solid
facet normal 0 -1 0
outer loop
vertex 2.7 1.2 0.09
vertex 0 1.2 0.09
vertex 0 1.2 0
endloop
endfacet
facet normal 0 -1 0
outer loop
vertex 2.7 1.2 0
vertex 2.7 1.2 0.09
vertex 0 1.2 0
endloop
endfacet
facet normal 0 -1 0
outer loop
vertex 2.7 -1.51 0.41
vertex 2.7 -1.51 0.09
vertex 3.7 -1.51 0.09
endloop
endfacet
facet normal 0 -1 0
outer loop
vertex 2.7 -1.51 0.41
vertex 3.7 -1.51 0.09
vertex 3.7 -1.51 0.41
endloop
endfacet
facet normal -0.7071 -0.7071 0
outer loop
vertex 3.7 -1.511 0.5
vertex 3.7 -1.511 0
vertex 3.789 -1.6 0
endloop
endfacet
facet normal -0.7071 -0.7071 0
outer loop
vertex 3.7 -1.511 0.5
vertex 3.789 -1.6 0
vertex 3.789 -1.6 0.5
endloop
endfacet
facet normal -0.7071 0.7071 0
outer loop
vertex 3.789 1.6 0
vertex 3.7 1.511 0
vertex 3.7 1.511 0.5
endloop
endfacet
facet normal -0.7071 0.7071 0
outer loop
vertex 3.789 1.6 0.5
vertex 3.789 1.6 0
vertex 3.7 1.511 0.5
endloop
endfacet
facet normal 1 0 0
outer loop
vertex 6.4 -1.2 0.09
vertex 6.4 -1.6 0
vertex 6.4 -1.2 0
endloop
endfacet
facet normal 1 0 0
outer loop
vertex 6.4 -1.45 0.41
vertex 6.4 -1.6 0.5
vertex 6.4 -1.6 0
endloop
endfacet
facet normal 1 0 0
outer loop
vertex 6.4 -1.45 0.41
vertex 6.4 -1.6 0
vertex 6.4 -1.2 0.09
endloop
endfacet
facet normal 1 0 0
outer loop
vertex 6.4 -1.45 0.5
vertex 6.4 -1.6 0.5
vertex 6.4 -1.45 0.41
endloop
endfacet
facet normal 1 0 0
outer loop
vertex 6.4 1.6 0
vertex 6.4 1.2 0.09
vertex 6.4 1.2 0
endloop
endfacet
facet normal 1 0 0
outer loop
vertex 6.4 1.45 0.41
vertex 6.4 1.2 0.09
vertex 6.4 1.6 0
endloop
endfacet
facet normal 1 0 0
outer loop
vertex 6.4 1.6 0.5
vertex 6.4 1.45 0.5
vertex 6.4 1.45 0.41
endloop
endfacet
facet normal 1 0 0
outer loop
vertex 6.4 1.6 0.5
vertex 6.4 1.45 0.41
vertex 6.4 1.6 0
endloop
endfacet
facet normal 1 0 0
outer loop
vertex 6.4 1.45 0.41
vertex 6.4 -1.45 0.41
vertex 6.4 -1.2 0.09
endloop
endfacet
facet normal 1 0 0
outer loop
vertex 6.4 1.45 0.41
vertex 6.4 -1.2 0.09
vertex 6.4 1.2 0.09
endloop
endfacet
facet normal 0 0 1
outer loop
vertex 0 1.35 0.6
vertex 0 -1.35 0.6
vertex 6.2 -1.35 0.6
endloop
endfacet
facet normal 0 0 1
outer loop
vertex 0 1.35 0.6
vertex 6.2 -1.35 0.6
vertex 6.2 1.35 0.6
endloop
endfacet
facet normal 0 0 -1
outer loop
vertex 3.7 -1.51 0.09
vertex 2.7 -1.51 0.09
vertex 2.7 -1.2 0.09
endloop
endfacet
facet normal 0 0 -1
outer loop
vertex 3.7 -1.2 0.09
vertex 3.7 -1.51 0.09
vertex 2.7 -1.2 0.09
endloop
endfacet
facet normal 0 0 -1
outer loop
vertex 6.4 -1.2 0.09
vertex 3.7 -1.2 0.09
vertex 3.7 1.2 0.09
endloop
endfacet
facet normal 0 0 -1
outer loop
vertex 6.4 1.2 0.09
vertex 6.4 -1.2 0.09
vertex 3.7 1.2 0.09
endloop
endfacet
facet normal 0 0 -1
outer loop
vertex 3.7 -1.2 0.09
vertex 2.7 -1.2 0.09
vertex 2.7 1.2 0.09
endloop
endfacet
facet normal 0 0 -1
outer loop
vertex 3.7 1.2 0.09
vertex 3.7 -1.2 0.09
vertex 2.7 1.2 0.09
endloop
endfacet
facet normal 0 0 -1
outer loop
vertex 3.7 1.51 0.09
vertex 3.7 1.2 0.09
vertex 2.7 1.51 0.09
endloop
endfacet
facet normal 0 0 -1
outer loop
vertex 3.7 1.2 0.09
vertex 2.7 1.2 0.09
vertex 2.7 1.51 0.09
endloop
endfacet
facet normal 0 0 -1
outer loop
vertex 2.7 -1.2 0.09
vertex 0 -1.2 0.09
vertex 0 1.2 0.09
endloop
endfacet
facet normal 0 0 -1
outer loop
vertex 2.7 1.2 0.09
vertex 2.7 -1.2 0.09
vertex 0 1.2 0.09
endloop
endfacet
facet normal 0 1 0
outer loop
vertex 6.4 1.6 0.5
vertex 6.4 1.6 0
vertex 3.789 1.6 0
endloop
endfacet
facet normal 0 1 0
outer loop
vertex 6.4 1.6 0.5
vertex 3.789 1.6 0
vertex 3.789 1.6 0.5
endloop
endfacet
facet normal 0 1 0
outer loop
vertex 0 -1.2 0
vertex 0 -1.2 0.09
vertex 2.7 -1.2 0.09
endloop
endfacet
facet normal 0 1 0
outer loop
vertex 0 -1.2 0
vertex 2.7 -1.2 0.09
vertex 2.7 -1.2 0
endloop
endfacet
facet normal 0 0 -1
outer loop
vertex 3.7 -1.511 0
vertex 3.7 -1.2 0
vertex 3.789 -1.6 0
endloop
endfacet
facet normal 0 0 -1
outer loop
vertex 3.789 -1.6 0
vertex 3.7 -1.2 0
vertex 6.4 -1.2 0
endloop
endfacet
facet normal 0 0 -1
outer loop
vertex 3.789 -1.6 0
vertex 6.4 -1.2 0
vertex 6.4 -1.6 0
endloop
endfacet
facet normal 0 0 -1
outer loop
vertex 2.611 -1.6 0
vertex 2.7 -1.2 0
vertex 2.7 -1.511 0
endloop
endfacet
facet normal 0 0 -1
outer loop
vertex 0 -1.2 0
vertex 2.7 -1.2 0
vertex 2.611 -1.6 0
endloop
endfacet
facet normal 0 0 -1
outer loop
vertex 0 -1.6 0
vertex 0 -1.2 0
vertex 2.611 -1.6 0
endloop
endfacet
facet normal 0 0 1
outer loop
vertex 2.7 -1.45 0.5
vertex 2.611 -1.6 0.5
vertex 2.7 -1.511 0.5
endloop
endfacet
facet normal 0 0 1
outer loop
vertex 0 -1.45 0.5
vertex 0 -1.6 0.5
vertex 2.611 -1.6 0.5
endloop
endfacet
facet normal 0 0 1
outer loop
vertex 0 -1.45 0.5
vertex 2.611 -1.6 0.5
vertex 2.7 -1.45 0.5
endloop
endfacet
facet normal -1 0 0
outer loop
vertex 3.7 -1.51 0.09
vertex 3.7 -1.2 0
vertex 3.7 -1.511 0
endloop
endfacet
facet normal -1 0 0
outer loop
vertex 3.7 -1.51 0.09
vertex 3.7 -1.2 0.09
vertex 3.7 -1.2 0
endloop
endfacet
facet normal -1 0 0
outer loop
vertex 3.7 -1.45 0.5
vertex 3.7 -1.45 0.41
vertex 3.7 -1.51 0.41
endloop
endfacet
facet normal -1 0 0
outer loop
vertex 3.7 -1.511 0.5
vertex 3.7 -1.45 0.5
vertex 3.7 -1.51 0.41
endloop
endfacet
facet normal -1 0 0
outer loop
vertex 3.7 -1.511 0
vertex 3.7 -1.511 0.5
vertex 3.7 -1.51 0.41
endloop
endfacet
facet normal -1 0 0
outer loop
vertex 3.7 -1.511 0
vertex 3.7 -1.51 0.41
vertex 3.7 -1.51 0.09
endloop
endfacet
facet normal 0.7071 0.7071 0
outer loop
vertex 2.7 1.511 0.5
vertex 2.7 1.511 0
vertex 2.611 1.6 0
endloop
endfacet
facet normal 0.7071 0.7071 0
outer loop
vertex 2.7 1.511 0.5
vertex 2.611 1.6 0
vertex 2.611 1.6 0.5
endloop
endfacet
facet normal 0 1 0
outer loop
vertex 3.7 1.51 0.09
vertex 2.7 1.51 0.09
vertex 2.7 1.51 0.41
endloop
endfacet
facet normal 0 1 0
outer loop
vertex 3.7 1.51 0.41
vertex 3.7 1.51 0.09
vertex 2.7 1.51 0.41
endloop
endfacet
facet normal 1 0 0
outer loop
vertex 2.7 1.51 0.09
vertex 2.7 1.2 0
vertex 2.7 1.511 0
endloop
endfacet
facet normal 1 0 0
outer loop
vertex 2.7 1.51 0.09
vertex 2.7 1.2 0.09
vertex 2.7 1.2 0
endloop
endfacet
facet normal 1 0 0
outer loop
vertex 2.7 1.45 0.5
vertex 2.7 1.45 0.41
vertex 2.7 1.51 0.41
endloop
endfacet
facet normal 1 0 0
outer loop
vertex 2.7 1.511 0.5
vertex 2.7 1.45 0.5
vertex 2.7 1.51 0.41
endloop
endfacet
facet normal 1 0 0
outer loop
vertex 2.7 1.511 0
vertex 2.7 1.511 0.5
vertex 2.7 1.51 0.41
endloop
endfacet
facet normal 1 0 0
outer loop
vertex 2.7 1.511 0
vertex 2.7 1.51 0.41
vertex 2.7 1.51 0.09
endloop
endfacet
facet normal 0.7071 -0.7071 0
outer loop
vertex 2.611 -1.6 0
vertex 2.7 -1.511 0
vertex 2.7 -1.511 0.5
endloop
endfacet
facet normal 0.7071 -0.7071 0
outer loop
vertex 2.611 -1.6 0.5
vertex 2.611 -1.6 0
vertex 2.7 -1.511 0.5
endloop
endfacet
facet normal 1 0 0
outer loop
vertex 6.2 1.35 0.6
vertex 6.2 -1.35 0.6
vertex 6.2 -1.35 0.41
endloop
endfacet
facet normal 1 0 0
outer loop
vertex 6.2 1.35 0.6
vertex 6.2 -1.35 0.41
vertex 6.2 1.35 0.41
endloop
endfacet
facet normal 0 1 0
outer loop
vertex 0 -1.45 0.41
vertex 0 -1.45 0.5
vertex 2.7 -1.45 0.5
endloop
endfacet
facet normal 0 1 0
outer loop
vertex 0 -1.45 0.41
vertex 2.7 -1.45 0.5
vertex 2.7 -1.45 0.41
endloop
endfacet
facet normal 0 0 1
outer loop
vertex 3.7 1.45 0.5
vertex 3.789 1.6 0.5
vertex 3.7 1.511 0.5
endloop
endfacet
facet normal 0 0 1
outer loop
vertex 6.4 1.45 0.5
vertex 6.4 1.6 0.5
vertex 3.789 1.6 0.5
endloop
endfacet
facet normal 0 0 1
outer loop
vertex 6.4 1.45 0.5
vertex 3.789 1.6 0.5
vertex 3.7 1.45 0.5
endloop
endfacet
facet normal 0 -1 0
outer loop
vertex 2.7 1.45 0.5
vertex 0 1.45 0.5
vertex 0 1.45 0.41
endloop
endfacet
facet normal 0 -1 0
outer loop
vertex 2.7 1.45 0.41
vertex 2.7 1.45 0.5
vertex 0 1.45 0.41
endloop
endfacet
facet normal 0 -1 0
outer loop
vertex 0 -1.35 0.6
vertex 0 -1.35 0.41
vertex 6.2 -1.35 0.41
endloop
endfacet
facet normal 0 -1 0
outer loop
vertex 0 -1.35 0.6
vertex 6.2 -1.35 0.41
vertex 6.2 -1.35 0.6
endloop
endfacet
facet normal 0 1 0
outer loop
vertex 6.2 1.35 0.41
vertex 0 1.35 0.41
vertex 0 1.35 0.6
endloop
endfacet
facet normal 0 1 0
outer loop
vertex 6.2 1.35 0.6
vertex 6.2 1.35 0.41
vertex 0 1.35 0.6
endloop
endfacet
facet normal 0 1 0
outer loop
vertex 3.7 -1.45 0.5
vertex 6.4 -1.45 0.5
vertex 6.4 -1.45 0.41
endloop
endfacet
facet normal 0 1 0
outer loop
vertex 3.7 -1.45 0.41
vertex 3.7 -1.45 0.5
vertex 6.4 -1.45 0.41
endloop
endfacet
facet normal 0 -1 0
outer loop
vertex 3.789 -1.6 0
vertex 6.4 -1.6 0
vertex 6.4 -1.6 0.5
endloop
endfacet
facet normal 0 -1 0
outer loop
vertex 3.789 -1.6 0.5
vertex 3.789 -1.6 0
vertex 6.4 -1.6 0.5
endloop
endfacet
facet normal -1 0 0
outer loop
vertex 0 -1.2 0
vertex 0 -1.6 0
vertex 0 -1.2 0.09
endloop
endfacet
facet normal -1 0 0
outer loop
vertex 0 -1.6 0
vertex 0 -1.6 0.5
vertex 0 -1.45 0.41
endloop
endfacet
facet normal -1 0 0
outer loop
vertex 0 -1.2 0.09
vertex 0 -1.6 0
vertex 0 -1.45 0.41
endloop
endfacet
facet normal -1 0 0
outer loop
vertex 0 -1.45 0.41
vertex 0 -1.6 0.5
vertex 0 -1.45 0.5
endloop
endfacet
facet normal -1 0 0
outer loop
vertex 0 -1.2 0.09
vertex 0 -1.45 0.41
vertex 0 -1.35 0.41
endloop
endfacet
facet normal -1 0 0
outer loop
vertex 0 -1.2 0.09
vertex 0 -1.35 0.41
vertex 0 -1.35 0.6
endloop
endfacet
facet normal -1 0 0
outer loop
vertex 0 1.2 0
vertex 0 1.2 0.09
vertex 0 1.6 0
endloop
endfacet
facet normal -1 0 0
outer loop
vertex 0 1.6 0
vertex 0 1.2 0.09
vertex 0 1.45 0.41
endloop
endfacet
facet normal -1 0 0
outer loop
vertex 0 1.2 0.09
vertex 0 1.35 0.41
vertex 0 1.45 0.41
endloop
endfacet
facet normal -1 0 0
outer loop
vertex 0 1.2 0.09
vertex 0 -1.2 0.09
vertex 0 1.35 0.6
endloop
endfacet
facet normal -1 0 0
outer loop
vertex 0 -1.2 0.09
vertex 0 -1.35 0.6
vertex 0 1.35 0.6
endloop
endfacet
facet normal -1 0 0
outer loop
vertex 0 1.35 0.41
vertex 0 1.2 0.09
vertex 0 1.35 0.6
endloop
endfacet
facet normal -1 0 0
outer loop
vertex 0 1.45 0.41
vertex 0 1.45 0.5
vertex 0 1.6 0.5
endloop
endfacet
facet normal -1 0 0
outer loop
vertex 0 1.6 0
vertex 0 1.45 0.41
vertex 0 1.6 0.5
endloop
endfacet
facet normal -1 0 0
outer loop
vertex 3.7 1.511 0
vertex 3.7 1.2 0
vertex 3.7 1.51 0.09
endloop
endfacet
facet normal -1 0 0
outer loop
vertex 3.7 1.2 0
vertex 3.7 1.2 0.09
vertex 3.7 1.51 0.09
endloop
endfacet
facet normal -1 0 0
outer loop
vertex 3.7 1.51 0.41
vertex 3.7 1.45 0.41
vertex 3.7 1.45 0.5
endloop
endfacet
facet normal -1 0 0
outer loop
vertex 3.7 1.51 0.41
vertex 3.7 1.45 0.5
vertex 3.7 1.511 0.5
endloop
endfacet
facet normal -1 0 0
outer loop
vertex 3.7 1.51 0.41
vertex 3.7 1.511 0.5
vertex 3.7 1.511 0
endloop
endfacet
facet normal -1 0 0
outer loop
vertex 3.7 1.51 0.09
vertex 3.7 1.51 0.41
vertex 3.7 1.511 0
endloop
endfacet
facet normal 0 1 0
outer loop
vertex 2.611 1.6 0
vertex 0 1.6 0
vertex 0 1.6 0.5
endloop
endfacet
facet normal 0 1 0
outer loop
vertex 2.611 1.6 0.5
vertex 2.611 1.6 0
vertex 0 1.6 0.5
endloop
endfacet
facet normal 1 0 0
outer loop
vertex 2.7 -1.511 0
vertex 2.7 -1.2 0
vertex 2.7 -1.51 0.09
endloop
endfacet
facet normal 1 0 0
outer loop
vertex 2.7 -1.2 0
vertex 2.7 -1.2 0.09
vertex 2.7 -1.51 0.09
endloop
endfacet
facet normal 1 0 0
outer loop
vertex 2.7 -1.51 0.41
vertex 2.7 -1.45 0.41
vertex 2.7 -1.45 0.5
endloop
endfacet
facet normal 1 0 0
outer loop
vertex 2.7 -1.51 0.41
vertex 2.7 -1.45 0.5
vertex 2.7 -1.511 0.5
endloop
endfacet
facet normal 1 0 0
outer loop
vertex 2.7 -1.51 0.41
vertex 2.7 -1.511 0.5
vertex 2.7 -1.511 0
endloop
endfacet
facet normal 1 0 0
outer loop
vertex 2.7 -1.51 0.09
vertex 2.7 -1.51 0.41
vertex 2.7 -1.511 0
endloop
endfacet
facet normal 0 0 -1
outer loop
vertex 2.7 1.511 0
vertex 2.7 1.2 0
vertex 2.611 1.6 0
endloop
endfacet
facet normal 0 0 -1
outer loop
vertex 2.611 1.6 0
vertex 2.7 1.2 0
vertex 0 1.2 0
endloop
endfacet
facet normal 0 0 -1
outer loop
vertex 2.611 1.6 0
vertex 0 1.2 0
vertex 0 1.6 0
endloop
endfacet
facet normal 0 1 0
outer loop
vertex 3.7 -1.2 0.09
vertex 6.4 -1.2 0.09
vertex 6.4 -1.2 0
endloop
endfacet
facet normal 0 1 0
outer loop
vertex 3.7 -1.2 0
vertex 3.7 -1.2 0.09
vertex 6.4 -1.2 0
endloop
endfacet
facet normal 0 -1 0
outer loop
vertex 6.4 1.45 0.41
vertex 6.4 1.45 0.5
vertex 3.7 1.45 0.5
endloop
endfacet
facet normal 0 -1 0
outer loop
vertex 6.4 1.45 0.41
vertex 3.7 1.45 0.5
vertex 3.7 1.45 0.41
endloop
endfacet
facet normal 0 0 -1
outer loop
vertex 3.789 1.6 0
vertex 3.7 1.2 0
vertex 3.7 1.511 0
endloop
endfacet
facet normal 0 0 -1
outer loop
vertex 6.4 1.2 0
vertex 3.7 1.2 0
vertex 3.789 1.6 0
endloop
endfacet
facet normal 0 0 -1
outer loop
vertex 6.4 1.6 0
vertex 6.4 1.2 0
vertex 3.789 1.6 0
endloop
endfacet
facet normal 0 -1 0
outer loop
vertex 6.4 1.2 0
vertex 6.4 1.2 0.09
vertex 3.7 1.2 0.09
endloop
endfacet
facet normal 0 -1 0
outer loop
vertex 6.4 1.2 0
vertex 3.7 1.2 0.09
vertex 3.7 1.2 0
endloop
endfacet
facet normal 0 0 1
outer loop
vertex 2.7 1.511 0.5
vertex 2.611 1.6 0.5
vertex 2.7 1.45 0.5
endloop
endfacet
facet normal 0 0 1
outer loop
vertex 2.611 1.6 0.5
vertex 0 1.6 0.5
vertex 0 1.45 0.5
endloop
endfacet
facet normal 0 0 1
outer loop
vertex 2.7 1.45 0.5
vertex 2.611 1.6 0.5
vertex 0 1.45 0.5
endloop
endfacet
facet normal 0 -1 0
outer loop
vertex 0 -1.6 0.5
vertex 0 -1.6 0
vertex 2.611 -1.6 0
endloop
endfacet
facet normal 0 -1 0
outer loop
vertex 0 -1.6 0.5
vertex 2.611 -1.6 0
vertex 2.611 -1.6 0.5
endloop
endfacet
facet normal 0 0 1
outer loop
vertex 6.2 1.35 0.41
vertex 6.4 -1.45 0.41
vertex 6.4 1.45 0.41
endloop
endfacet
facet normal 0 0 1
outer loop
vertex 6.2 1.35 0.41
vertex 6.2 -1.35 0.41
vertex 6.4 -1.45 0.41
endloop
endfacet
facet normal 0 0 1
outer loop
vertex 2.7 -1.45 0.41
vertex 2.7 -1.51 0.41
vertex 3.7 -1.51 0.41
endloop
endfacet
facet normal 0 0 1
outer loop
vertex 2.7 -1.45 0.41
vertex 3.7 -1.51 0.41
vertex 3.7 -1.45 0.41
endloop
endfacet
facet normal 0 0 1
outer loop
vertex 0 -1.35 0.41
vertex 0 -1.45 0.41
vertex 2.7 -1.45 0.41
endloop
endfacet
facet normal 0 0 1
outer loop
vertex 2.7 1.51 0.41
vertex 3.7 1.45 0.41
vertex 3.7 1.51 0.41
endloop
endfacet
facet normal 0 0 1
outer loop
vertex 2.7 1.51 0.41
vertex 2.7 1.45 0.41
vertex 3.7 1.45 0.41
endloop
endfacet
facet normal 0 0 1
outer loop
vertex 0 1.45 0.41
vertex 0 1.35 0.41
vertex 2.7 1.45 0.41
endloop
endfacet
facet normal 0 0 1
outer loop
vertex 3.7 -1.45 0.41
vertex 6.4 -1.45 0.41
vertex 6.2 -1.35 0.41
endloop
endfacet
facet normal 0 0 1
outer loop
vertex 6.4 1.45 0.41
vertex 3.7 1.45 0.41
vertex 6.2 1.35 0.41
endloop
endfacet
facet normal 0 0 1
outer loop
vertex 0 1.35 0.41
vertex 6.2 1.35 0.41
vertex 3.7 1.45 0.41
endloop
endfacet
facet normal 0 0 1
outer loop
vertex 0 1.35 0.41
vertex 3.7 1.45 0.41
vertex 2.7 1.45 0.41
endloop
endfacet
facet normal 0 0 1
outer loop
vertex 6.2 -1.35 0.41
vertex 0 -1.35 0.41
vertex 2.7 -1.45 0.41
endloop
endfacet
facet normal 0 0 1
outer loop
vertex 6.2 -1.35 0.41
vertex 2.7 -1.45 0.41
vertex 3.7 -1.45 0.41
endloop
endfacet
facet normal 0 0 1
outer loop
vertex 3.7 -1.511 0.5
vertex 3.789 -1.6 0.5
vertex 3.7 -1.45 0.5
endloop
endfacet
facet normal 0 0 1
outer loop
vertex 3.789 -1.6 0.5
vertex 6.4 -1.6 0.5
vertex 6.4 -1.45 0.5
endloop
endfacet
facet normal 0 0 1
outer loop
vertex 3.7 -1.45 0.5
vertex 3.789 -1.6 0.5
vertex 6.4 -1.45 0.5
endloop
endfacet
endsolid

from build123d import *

# Parameters (mm, degrees)
SKETCH001_W  = 2.7
SKETCH001_H  = 0.19
PAD001_DEPTH = 6.2
SKETCH_W     = 3.02
SKETCH_H     = 0.32
PAD_DEPTH    = 6.4
PAD002_DEPTH = 2.7
CHAMFER_SIZE = 0.089


with BuildPart() as body001:
    # Sketch001 → Pad001 (new body)
    with BuildSketch(Plane.YZ):
        with Locations((0, 0.505)):
            Rectangle(SKETCH001_W, SKETCH001_H)
    extrude(amount=PAD001_DEPTH)


with BuildPart() as fusion002:
    # Sketch → Pad (new body)
    with BuildSketch(Plane.YZ):
        with Locations((0, 0.25)):
            Rectangle(SKETCH_W, SKETCH_H)
    extrude(amount=PAD_DEPTH)

    # Fusion002: union Body001
    add(body001.part)


with BuildPart() as body002:
    # Sketch002 → Pad002 (new body)
    with BuildSketch(Plane.YZ):
        Polygon((-1.45, 0.41), (-1.51, 0.41), (-1.51, 0.09), (-1.2, 0.09), (-1.2, 0), (-1.6, 0), (-1.6, 0.5), (-1.45, 0.5), align=None)
    extrude(amount=PAD002_DEPTH)

    # Chamfer
    chamfer_edges = [body002.edges().sort_by_distance(p)[0] for p in [
        (2.7, -1.6, 0.25),
    ]]
    chamfer(chamfer_edges, length=CHAMFER_SIZE)


with BuildPart() as mirror_of_body002:
    # mirror: instance of Body002
    add(body002.part.mirror(Plane(origin=(3.2, 0, 0), x_dir=(0, -1, 0), z_dir=(1, 0, 0))))


with BuildPart() as fusion:
    # Fusion base: copy of Body002
    add(body002.part)

    # Fusion: union Mirror of Body002
    add(mirror_of_body002.part)


with BuildPart() as mirror_of_fusion:
    # mirror001: instance of Fusion
    add(fusion.part.mirror(Plane(origin=(0, 0, 0), x_dir=(1, 0, 0), z_dir=(0, 1, 0))))


with BuildPart() as lvk25:
    # Fusion001 base: copy of Fusion
    add(fusion.part)

    # Fusion001: union Mirror of Fusion
    add(mirror_of_fusion.part)

    # Fusion003: union Fusion002
    add(fusion002.part)


solid = lvk25.part
